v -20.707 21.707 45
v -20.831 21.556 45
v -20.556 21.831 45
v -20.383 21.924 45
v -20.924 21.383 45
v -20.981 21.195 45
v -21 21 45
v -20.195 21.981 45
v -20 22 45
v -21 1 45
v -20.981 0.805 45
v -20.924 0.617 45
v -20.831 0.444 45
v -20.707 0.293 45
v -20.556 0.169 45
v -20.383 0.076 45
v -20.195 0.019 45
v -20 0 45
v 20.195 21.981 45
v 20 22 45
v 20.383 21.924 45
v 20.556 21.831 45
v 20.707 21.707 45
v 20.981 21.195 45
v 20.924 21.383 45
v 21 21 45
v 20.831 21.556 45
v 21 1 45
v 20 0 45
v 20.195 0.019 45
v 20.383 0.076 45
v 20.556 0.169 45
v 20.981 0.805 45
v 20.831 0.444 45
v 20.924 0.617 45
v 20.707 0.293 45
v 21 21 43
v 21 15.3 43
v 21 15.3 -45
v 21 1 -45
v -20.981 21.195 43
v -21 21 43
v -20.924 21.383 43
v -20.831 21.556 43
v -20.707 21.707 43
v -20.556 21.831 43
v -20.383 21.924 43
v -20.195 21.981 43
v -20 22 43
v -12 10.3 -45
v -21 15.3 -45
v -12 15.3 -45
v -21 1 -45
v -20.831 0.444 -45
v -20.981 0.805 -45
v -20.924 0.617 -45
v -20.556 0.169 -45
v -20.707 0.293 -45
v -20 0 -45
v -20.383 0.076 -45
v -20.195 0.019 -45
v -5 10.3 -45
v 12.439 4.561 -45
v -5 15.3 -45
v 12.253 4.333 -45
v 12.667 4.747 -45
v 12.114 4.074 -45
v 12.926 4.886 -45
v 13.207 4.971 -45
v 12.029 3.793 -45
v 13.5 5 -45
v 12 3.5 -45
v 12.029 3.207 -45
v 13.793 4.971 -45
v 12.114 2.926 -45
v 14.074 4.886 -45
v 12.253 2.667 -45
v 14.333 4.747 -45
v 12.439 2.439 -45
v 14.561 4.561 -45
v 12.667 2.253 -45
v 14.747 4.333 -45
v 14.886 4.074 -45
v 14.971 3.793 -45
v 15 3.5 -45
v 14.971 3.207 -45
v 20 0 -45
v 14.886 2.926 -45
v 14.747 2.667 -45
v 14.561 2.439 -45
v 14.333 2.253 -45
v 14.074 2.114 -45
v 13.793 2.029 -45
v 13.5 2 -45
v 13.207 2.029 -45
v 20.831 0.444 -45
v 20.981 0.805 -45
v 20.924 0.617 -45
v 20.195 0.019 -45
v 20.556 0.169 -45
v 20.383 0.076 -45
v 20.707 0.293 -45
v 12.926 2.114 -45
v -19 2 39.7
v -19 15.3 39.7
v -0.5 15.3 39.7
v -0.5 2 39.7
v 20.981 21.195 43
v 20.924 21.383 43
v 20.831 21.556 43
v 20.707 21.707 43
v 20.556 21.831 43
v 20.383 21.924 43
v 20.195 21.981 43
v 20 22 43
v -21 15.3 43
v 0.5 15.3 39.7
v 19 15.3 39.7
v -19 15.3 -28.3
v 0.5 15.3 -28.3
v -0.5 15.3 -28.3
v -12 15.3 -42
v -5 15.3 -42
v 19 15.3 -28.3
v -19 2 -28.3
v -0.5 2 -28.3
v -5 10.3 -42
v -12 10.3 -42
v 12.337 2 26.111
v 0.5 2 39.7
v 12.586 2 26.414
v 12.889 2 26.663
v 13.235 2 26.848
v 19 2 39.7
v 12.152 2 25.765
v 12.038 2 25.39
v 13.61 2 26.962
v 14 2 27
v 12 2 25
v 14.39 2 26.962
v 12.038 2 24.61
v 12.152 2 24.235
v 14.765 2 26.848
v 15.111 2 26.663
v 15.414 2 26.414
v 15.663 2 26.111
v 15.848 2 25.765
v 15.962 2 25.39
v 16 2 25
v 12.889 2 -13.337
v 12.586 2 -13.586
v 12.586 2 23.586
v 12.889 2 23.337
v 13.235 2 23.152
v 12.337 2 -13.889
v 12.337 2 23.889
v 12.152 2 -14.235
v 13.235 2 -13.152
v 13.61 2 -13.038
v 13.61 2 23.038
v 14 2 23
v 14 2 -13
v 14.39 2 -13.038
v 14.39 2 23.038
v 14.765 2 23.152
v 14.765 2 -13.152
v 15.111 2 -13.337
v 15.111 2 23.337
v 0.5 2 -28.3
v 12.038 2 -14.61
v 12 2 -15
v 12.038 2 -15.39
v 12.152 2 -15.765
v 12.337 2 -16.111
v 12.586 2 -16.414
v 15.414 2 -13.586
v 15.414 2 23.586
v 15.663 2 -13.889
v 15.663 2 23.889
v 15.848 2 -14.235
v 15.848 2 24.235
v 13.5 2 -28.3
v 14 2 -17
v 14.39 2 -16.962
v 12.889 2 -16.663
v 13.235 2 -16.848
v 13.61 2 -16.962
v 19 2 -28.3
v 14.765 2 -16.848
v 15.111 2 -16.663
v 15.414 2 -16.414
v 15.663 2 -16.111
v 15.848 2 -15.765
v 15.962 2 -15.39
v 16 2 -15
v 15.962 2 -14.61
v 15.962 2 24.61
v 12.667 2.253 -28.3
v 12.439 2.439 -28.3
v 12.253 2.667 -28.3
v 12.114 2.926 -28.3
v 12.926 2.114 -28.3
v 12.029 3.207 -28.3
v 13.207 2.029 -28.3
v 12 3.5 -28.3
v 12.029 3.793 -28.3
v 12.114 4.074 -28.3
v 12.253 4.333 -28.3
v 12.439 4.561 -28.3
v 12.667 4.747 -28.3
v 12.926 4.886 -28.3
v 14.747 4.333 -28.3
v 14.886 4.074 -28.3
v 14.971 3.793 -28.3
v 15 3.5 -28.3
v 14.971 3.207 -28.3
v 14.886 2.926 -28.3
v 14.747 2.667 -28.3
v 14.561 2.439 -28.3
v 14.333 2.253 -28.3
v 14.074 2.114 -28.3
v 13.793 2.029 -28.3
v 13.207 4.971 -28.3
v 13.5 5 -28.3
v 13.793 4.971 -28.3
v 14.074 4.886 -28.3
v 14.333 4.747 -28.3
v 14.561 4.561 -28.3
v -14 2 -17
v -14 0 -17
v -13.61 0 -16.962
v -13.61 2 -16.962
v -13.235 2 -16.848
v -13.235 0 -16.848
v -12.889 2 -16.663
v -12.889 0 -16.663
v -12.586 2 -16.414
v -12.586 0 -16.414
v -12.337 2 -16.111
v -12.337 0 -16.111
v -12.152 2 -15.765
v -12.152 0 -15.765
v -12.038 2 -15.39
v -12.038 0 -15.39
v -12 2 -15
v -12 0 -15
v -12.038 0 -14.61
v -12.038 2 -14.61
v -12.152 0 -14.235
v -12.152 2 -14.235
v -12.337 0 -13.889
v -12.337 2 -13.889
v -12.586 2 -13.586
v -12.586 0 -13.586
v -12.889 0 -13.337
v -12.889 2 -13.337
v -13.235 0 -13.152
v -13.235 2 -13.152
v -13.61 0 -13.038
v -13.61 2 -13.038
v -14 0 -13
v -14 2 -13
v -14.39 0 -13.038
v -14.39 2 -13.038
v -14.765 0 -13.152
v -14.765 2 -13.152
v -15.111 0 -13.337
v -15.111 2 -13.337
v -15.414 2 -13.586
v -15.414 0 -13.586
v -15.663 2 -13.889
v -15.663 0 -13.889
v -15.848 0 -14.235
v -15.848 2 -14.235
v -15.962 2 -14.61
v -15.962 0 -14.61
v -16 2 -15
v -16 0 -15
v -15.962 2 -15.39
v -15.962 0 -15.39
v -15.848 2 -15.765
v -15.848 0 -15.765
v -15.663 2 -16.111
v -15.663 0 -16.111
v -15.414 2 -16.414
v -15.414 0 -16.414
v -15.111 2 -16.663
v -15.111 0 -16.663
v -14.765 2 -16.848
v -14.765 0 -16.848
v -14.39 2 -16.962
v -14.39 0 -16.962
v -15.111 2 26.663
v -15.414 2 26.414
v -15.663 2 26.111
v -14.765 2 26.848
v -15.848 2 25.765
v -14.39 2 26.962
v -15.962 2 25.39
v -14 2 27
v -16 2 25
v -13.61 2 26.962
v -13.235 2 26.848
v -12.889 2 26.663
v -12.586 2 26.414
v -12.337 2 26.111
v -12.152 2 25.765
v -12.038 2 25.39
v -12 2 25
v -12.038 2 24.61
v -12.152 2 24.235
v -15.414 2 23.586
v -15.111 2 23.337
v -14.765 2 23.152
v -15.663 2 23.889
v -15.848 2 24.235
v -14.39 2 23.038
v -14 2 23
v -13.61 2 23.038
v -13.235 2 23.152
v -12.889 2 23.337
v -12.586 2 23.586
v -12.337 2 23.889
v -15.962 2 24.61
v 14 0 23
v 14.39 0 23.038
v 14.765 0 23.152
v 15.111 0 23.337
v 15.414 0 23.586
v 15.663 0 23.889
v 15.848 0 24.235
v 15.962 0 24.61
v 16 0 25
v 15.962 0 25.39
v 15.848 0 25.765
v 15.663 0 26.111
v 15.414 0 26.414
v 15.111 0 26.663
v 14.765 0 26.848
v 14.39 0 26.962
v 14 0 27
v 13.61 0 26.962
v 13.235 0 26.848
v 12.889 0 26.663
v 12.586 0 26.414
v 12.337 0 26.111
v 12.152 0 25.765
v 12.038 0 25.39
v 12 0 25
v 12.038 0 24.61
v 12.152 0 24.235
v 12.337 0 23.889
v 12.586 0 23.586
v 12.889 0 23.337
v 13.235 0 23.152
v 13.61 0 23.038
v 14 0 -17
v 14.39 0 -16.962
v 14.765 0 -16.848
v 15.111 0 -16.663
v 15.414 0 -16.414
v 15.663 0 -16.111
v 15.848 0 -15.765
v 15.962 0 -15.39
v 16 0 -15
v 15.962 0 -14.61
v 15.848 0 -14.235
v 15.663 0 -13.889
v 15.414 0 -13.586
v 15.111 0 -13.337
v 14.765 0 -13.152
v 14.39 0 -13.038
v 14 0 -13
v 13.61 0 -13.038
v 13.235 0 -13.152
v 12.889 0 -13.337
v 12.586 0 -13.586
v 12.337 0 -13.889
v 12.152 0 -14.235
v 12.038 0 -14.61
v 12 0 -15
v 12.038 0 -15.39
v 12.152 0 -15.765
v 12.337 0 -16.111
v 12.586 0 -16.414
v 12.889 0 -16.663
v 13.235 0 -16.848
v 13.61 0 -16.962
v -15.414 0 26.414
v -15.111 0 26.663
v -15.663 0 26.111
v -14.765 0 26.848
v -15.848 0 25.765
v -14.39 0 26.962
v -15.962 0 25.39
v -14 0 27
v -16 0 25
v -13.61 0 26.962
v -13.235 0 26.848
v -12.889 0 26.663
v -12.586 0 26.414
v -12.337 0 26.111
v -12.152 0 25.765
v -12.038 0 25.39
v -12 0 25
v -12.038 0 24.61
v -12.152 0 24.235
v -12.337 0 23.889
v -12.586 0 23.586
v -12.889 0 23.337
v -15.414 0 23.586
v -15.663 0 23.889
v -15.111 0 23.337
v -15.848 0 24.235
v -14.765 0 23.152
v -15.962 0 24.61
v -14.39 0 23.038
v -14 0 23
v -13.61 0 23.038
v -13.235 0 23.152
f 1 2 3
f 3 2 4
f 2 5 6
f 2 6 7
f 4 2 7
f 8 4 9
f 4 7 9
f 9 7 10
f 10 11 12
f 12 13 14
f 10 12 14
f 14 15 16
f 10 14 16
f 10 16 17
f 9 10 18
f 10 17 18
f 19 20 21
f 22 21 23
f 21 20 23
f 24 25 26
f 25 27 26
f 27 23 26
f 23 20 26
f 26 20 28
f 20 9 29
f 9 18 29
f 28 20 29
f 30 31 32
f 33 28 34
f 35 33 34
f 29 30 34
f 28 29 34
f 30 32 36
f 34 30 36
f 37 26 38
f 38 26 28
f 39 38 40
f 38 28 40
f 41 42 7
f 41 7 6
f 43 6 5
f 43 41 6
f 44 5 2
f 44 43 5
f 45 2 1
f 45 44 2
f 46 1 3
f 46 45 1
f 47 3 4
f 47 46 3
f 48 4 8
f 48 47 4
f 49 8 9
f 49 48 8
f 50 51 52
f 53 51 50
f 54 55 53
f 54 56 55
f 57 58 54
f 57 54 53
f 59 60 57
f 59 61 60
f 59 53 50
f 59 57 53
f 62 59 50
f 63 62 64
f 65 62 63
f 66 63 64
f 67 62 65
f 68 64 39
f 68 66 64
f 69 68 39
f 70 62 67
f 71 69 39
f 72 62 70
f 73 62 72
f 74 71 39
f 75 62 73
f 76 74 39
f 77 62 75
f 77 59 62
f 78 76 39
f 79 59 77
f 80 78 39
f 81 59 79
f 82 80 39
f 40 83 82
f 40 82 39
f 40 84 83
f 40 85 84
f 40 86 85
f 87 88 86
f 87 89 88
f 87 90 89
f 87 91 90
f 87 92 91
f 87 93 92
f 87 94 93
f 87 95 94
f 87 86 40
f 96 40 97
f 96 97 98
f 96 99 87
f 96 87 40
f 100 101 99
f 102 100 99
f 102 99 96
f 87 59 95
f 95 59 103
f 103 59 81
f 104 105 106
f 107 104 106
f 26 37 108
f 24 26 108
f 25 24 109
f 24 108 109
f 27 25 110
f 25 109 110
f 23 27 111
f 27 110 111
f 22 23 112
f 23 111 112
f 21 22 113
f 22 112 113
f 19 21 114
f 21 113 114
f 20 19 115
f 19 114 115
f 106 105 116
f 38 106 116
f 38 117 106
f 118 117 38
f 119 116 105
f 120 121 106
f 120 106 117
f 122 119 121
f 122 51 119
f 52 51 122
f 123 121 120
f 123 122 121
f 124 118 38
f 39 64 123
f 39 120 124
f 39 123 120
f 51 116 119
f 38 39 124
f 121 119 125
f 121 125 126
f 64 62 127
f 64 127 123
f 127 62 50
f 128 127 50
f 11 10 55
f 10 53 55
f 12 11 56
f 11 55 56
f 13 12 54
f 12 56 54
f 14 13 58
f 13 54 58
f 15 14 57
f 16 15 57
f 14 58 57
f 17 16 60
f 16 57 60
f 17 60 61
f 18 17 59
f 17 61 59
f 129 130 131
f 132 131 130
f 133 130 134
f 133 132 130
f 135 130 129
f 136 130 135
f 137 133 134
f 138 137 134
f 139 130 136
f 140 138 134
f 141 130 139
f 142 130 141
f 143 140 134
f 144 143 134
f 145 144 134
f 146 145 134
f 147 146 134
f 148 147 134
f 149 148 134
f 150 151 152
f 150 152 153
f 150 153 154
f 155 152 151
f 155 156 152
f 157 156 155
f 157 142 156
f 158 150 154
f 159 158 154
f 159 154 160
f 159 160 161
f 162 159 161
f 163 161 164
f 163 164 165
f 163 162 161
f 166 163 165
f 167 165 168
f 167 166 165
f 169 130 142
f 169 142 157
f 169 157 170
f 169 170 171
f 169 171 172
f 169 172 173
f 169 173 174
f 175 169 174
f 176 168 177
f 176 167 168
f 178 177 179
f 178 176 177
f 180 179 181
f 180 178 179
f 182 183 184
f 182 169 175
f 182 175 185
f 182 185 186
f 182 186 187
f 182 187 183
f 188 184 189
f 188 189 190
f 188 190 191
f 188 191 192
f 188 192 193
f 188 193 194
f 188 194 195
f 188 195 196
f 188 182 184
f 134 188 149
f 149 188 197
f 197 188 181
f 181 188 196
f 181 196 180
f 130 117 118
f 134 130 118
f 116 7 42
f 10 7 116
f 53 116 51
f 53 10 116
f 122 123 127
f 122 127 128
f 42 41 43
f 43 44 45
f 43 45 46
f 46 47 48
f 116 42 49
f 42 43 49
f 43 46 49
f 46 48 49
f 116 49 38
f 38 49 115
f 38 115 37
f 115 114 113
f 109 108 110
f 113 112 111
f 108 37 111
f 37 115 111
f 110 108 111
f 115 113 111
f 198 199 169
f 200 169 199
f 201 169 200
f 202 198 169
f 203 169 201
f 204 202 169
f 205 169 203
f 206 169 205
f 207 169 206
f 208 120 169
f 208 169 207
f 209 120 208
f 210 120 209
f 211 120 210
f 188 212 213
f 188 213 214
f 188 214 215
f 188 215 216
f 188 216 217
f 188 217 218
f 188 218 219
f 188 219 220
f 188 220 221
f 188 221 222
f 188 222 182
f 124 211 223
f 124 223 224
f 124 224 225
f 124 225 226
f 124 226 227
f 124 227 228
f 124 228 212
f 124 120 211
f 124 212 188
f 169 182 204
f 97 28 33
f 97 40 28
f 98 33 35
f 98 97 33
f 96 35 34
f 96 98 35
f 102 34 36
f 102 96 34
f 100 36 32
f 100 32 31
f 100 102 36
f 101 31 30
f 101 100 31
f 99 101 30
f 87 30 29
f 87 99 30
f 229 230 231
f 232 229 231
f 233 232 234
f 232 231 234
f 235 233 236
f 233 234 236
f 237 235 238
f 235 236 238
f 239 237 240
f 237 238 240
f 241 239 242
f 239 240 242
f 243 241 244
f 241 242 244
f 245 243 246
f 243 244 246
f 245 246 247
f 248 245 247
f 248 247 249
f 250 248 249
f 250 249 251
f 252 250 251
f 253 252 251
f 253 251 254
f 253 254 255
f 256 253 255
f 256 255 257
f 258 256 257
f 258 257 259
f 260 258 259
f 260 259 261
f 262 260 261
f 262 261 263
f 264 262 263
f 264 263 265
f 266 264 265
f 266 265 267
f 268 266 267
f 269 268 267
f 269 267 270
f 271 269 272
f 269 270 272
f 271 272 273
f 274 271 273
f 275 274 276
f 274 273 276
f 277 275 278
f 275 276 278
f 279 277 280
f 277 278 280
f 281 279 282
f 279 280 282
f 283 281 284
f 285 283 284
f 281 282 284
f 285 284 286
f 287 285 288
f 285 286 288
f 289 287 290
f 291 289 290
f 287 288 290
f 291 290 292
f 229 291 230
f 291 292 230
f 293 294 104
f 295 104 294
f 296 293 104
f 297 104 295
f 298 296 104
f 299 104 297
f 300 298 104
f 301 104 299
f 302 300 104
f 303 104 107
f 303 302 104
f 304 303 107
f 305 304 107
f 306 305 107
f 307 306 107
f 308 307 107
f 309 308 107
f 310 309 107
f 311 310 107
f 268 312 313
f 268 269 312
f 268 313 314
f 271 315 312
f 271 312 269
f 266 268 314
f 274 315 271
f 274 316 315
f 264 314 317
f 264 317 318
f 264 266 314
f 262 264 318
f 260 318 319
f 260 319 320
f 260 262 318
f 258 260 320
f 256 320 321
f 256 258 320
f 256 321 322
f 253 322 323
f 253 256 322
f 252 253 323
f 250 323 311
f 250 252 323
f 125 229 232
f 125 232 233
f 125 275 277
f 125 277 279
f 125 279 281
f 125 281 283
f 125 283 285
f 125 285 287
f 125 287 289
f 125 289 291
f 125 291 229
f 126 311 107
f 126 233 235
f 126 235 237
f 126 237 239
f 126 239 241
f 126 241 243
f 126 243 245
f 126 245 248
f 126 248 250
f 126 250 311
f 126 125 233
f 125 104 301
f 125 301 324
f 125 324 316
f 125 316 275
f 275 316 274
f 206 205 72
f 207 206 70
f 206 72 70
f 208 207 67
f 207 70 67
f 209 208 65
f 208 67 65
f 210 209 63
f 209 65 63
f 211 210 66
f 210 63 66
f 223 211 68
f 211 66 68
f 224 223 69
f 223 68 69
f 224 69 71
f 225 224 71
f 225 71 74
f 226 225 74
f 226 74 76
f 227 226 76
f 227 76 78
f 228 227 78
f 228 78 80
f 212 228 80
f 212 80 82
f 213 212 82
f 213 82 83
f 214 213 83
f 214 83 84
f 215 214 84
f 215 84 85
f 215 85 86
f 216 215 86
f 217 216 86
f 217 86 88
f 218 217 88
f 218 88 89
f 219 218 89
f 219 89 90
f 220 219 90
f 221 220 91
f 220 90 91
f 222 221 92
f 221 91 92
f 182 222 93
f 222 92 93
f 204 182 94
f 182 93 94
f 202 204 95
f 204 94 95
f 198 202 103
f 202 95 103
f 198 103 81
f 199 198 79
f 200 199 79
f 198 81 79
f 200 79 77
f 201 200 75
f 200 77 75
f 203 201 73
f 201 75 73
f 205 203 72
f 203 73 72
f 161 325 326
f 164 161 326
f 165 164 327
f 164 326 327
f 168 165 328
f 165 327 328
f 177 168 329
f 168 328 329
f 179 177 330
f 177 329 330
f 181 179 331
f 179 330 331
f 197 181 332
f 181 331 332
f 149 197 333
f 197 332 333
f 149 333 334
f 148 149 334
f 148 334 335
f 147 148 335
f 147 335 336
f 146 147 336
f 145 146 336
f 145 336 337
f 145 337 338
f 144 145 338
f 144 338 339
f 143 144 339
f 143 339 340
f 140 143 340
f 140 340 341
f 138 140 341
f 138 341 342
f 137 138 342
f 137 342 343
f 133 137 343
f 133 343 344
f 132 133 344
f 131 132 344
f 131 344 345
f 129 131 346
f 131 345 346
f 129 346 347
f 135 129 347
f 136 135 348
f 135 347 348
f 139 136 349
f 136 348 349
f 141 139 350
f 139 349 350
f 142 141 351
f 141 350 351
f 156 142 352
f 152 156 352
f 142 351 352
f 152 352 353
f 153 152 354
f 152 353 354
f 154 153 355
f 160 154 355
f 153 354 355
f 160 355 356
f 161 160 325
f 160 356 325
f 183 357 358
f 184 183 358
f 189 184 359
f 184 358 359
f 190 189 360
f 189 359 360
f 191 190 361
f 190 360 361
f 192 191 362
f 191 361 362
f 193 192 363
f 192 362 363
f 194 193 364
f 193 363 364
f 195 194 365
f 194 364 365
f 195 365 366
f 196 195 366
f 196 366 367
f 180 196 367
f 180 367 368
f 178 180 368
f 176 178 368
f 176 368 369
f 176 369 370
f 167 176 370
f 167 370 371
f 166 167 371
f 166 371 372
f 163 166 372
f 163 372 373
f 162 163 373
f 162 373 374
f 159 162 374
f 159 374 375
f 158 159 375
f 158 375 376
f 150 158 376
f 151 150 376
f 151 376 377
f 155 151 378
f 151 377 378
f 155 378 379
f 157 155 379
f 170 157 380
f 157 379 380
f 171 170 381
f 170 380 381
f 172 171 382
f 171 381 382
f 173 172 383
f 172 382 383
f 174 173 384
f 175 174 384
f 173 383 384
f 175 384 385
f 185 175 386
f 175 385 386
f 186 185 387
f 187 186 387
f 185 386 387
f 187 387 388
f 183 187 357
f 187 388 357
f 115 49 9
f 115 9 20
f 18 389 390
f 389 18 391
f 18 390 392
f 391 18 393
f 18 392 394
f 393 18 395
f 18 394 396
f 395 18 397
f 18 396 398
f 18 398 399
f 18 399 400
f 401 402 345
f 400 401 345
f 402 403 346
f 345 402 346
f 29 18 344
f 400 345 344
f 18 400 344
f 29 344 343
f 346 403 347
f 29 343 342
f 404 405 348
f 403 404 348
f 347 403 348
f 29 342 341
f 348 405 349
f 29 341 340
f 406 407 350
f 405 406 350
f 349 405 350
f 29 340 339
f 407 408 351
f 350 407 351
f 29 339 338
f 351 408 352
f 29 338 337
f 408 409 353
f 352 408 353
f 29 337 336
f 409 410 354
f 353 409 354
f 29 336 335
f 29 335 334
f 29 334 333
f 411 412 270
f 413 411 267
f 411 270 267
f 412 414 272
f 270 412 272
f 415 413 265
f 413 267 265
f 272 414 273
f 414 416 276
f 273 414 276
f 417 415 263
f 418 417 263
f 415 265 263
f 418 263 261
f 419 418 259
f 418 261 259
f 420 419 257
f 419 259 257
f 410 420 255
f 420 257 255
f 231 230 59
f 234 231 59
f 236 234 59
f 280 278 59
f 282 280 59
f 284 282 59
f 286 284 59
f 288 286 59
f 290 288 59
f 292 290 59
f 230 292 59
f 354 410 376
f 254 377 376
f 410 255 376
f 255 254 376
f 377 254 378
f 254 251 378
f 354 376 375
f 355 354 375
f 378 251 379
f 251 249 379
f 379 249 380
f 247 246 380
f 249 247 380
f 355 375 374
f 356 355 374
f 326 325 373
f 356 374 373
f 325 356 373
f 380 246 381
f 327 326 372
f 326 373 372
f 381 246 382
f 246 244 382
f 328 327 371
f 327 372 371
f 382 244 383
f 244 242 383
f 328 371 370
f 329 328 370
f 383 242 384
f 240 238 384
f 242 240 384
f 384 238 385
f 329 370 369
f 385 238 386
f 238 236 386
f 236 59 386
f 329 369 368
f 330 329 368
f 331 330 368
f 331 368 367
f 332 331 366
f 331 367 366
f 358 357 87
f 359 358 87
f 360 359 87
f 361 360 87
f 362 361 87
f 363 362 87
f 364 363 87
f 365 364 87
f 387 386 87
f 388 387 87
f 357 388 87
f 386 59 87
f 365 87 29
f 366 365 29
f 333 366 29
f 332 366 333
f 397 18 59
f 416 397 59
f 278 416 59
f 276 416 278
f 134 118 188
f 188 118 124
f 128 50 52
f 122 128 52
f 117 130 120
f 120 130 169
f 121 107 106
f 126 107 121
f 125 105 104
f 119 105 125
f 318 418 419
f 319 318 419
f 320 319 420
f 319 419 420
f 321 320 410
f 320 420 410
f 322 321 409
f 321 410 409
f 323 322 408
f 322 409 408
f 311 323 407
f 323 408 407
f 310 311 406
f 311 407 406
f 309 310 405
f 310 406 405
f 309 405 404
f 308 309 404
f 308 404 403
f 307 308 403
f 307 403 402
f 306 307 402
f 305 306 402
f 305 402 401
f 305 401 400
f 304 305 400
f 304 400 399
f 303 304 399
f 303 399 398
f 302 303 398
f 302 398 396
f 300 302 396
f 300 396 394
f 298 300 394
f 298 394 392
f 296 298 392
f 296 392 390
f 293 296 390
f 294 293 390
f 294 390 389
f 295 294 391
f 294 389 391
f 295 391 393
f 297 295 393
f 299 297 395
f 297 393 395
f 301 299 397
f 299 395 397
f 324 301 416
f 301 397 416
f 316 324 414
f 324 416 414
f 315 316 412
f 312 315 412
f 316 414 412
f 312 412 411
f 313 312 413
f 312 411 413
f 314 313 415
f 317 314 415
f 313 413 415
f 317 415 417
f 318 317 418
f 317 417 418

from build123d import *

# Parameters (mm, degrees)
SKETCH1_W           = 42
SKETCH1_H           = 90
BOSS_EXTRUDE1_DEPTH = 22
FILLET1_R           = 1
SKETCH2_W           = 38
SKETCH2_H           = 68
CUT_EXTRUDE1_DEPTH  = 20
SKETCH3_W           = 1
SKETCH3_H           = 68
BOSS_EXTRUDE2_DEPTH = 20
SKETCH4_W           = 42
SKETCH4_H           = 88
CUT_EXTRUDE2_DEPTH  = 6.7
CUT_EXTRUDE3_REACH  = 97
SKETCH5_R           = 1.5
SKETCH6_W           = 7
SKETCH6_H           = 5
CUT_EXTRUDE4_DEPTH  = 3
SKETCH7_R           = 2
CUT_EXTRUDE5_DEPTH  = 55.313902456


with BuildPart() as part:
    # Sketch1 → Boss-Extrude1 (new body)
    with BuildSketch(Plane(origin=(0, 0, 0), x_dir=(1, 0, 0), z_dir=(0, 1, 0))):
        Rectangle(SKETCH1_W, SKETCH1_H)
    extrude(amount=BOSS_EXTRUDE1_DEPTH)

    # Fillet1
    fillet1_edges = [part.edges().sort_by_distance(p)[0] for p in [
        (-21, 22, 0),
        (21, 22, 0),
        (-21, 0, 0),
        (21, 0, 0),
    ]]
    fillet(fillet1_edges, radius=FILLET1_R)

    # Sketch2 → Cut-Extrude1 (cut)
    with BuildSketch(Plane(origin=(0, 22, 0), x_dir=(1, 0, 0), z_dir=(0, 1, 0))):
        with Locations((0, -5.7)):
            Rectangle(SKETCH2_W, SKETCH2_H)
    extrude(amount=-CUT_EXTRUDE1_DEPTH, mode=Mode.SUBTRACT)

    # Sketch3 → Boss-Extrude2 (add)
    with BuildSketch(Plane(origin=(0, 2, 0), x_dir=(1, 0, 0), z_dir=(0, 1, 0))):
        with Locations((0, -5.7)):
            Rectangle(SKETCH3_W, SKETCH3_H)
    extrude(amount=BOSS_EXTRUDE2_DEPTH)

    # Sketch4 → Cut-Extrude2 (cut)
    with BuildSketch(Plane(origin=(0, 22, 0), x_dir=(1, 0, 0), z_dir=(0, 1, 0))):
        with Locations((0, 1)):
            Rectangle(SKETCH4_W, SKETCH4_H)
    extrude(amount=-CUT_EXTRUDE2_DEPTH, mode=Mode.SUBTRACT)

    # Sketch5 → Cut-Extrude3 (cut, up to next)
    with BuildSketch(Plane(origin=(0, 0, -45), x_dir=(-1, 0, 0), z_dir=(0, 0, -1)), mode=Mode.PRIVATE) as cut_extrude3_sk1:
        with Locations((-13.5, 3.5)):
            Circle(SKETCH5_R)
    cut_extrude3_tool1 = extrude(cut_extrude3_sk1.sketch, amount=-CUT_EXTRUDE3_REACH, mode=Mode.PRIVATE) & part.part
    add(cut_extrude3_tool1.solids().sort_by_distance((13.5, 3.5, -45))[0], mode=Mode.SUBTRACT)

    # Sketch6 → Cut-Extrude4 (cut)
    with BuildSketch(Plane(origin=(0, 0, -45), x_dir=(-1, 0, 0), z_dir=(0, 0, -1))):
        with Locations((8.5, 12.8)):
            Rectangle(SKETCH6_W, SKETCH6_H)
    extrude(amount=-CUT_EXTRUDE4_DEPTH, mode=Mode.SUBTRACT)

    # Sketch7 → Cut-Extrude5 (cut, through all)
    with BuildSketch(Plane.XZ):
        with Locations(Location((14, -15, 0), (0, 0, 270))):
            Circle(SKETCH7_R)
        with Locations(Location((14, 25, 0), (0, 0, 270))):
            Circle(SKETCH7_R)
        with Locations(Location((-14, 25, 0), (0, 0, 270))):
            Circle(SKETCH7_R)
        with Locations(Location((-14, -15, 0), (0, 0, 270))):
            Circle(SKETCH7_R)
    extrude(amount=-CUT_EXTRUDE5_DEPTH, mode=Mode.SUBTRACT)


solid = part.part
